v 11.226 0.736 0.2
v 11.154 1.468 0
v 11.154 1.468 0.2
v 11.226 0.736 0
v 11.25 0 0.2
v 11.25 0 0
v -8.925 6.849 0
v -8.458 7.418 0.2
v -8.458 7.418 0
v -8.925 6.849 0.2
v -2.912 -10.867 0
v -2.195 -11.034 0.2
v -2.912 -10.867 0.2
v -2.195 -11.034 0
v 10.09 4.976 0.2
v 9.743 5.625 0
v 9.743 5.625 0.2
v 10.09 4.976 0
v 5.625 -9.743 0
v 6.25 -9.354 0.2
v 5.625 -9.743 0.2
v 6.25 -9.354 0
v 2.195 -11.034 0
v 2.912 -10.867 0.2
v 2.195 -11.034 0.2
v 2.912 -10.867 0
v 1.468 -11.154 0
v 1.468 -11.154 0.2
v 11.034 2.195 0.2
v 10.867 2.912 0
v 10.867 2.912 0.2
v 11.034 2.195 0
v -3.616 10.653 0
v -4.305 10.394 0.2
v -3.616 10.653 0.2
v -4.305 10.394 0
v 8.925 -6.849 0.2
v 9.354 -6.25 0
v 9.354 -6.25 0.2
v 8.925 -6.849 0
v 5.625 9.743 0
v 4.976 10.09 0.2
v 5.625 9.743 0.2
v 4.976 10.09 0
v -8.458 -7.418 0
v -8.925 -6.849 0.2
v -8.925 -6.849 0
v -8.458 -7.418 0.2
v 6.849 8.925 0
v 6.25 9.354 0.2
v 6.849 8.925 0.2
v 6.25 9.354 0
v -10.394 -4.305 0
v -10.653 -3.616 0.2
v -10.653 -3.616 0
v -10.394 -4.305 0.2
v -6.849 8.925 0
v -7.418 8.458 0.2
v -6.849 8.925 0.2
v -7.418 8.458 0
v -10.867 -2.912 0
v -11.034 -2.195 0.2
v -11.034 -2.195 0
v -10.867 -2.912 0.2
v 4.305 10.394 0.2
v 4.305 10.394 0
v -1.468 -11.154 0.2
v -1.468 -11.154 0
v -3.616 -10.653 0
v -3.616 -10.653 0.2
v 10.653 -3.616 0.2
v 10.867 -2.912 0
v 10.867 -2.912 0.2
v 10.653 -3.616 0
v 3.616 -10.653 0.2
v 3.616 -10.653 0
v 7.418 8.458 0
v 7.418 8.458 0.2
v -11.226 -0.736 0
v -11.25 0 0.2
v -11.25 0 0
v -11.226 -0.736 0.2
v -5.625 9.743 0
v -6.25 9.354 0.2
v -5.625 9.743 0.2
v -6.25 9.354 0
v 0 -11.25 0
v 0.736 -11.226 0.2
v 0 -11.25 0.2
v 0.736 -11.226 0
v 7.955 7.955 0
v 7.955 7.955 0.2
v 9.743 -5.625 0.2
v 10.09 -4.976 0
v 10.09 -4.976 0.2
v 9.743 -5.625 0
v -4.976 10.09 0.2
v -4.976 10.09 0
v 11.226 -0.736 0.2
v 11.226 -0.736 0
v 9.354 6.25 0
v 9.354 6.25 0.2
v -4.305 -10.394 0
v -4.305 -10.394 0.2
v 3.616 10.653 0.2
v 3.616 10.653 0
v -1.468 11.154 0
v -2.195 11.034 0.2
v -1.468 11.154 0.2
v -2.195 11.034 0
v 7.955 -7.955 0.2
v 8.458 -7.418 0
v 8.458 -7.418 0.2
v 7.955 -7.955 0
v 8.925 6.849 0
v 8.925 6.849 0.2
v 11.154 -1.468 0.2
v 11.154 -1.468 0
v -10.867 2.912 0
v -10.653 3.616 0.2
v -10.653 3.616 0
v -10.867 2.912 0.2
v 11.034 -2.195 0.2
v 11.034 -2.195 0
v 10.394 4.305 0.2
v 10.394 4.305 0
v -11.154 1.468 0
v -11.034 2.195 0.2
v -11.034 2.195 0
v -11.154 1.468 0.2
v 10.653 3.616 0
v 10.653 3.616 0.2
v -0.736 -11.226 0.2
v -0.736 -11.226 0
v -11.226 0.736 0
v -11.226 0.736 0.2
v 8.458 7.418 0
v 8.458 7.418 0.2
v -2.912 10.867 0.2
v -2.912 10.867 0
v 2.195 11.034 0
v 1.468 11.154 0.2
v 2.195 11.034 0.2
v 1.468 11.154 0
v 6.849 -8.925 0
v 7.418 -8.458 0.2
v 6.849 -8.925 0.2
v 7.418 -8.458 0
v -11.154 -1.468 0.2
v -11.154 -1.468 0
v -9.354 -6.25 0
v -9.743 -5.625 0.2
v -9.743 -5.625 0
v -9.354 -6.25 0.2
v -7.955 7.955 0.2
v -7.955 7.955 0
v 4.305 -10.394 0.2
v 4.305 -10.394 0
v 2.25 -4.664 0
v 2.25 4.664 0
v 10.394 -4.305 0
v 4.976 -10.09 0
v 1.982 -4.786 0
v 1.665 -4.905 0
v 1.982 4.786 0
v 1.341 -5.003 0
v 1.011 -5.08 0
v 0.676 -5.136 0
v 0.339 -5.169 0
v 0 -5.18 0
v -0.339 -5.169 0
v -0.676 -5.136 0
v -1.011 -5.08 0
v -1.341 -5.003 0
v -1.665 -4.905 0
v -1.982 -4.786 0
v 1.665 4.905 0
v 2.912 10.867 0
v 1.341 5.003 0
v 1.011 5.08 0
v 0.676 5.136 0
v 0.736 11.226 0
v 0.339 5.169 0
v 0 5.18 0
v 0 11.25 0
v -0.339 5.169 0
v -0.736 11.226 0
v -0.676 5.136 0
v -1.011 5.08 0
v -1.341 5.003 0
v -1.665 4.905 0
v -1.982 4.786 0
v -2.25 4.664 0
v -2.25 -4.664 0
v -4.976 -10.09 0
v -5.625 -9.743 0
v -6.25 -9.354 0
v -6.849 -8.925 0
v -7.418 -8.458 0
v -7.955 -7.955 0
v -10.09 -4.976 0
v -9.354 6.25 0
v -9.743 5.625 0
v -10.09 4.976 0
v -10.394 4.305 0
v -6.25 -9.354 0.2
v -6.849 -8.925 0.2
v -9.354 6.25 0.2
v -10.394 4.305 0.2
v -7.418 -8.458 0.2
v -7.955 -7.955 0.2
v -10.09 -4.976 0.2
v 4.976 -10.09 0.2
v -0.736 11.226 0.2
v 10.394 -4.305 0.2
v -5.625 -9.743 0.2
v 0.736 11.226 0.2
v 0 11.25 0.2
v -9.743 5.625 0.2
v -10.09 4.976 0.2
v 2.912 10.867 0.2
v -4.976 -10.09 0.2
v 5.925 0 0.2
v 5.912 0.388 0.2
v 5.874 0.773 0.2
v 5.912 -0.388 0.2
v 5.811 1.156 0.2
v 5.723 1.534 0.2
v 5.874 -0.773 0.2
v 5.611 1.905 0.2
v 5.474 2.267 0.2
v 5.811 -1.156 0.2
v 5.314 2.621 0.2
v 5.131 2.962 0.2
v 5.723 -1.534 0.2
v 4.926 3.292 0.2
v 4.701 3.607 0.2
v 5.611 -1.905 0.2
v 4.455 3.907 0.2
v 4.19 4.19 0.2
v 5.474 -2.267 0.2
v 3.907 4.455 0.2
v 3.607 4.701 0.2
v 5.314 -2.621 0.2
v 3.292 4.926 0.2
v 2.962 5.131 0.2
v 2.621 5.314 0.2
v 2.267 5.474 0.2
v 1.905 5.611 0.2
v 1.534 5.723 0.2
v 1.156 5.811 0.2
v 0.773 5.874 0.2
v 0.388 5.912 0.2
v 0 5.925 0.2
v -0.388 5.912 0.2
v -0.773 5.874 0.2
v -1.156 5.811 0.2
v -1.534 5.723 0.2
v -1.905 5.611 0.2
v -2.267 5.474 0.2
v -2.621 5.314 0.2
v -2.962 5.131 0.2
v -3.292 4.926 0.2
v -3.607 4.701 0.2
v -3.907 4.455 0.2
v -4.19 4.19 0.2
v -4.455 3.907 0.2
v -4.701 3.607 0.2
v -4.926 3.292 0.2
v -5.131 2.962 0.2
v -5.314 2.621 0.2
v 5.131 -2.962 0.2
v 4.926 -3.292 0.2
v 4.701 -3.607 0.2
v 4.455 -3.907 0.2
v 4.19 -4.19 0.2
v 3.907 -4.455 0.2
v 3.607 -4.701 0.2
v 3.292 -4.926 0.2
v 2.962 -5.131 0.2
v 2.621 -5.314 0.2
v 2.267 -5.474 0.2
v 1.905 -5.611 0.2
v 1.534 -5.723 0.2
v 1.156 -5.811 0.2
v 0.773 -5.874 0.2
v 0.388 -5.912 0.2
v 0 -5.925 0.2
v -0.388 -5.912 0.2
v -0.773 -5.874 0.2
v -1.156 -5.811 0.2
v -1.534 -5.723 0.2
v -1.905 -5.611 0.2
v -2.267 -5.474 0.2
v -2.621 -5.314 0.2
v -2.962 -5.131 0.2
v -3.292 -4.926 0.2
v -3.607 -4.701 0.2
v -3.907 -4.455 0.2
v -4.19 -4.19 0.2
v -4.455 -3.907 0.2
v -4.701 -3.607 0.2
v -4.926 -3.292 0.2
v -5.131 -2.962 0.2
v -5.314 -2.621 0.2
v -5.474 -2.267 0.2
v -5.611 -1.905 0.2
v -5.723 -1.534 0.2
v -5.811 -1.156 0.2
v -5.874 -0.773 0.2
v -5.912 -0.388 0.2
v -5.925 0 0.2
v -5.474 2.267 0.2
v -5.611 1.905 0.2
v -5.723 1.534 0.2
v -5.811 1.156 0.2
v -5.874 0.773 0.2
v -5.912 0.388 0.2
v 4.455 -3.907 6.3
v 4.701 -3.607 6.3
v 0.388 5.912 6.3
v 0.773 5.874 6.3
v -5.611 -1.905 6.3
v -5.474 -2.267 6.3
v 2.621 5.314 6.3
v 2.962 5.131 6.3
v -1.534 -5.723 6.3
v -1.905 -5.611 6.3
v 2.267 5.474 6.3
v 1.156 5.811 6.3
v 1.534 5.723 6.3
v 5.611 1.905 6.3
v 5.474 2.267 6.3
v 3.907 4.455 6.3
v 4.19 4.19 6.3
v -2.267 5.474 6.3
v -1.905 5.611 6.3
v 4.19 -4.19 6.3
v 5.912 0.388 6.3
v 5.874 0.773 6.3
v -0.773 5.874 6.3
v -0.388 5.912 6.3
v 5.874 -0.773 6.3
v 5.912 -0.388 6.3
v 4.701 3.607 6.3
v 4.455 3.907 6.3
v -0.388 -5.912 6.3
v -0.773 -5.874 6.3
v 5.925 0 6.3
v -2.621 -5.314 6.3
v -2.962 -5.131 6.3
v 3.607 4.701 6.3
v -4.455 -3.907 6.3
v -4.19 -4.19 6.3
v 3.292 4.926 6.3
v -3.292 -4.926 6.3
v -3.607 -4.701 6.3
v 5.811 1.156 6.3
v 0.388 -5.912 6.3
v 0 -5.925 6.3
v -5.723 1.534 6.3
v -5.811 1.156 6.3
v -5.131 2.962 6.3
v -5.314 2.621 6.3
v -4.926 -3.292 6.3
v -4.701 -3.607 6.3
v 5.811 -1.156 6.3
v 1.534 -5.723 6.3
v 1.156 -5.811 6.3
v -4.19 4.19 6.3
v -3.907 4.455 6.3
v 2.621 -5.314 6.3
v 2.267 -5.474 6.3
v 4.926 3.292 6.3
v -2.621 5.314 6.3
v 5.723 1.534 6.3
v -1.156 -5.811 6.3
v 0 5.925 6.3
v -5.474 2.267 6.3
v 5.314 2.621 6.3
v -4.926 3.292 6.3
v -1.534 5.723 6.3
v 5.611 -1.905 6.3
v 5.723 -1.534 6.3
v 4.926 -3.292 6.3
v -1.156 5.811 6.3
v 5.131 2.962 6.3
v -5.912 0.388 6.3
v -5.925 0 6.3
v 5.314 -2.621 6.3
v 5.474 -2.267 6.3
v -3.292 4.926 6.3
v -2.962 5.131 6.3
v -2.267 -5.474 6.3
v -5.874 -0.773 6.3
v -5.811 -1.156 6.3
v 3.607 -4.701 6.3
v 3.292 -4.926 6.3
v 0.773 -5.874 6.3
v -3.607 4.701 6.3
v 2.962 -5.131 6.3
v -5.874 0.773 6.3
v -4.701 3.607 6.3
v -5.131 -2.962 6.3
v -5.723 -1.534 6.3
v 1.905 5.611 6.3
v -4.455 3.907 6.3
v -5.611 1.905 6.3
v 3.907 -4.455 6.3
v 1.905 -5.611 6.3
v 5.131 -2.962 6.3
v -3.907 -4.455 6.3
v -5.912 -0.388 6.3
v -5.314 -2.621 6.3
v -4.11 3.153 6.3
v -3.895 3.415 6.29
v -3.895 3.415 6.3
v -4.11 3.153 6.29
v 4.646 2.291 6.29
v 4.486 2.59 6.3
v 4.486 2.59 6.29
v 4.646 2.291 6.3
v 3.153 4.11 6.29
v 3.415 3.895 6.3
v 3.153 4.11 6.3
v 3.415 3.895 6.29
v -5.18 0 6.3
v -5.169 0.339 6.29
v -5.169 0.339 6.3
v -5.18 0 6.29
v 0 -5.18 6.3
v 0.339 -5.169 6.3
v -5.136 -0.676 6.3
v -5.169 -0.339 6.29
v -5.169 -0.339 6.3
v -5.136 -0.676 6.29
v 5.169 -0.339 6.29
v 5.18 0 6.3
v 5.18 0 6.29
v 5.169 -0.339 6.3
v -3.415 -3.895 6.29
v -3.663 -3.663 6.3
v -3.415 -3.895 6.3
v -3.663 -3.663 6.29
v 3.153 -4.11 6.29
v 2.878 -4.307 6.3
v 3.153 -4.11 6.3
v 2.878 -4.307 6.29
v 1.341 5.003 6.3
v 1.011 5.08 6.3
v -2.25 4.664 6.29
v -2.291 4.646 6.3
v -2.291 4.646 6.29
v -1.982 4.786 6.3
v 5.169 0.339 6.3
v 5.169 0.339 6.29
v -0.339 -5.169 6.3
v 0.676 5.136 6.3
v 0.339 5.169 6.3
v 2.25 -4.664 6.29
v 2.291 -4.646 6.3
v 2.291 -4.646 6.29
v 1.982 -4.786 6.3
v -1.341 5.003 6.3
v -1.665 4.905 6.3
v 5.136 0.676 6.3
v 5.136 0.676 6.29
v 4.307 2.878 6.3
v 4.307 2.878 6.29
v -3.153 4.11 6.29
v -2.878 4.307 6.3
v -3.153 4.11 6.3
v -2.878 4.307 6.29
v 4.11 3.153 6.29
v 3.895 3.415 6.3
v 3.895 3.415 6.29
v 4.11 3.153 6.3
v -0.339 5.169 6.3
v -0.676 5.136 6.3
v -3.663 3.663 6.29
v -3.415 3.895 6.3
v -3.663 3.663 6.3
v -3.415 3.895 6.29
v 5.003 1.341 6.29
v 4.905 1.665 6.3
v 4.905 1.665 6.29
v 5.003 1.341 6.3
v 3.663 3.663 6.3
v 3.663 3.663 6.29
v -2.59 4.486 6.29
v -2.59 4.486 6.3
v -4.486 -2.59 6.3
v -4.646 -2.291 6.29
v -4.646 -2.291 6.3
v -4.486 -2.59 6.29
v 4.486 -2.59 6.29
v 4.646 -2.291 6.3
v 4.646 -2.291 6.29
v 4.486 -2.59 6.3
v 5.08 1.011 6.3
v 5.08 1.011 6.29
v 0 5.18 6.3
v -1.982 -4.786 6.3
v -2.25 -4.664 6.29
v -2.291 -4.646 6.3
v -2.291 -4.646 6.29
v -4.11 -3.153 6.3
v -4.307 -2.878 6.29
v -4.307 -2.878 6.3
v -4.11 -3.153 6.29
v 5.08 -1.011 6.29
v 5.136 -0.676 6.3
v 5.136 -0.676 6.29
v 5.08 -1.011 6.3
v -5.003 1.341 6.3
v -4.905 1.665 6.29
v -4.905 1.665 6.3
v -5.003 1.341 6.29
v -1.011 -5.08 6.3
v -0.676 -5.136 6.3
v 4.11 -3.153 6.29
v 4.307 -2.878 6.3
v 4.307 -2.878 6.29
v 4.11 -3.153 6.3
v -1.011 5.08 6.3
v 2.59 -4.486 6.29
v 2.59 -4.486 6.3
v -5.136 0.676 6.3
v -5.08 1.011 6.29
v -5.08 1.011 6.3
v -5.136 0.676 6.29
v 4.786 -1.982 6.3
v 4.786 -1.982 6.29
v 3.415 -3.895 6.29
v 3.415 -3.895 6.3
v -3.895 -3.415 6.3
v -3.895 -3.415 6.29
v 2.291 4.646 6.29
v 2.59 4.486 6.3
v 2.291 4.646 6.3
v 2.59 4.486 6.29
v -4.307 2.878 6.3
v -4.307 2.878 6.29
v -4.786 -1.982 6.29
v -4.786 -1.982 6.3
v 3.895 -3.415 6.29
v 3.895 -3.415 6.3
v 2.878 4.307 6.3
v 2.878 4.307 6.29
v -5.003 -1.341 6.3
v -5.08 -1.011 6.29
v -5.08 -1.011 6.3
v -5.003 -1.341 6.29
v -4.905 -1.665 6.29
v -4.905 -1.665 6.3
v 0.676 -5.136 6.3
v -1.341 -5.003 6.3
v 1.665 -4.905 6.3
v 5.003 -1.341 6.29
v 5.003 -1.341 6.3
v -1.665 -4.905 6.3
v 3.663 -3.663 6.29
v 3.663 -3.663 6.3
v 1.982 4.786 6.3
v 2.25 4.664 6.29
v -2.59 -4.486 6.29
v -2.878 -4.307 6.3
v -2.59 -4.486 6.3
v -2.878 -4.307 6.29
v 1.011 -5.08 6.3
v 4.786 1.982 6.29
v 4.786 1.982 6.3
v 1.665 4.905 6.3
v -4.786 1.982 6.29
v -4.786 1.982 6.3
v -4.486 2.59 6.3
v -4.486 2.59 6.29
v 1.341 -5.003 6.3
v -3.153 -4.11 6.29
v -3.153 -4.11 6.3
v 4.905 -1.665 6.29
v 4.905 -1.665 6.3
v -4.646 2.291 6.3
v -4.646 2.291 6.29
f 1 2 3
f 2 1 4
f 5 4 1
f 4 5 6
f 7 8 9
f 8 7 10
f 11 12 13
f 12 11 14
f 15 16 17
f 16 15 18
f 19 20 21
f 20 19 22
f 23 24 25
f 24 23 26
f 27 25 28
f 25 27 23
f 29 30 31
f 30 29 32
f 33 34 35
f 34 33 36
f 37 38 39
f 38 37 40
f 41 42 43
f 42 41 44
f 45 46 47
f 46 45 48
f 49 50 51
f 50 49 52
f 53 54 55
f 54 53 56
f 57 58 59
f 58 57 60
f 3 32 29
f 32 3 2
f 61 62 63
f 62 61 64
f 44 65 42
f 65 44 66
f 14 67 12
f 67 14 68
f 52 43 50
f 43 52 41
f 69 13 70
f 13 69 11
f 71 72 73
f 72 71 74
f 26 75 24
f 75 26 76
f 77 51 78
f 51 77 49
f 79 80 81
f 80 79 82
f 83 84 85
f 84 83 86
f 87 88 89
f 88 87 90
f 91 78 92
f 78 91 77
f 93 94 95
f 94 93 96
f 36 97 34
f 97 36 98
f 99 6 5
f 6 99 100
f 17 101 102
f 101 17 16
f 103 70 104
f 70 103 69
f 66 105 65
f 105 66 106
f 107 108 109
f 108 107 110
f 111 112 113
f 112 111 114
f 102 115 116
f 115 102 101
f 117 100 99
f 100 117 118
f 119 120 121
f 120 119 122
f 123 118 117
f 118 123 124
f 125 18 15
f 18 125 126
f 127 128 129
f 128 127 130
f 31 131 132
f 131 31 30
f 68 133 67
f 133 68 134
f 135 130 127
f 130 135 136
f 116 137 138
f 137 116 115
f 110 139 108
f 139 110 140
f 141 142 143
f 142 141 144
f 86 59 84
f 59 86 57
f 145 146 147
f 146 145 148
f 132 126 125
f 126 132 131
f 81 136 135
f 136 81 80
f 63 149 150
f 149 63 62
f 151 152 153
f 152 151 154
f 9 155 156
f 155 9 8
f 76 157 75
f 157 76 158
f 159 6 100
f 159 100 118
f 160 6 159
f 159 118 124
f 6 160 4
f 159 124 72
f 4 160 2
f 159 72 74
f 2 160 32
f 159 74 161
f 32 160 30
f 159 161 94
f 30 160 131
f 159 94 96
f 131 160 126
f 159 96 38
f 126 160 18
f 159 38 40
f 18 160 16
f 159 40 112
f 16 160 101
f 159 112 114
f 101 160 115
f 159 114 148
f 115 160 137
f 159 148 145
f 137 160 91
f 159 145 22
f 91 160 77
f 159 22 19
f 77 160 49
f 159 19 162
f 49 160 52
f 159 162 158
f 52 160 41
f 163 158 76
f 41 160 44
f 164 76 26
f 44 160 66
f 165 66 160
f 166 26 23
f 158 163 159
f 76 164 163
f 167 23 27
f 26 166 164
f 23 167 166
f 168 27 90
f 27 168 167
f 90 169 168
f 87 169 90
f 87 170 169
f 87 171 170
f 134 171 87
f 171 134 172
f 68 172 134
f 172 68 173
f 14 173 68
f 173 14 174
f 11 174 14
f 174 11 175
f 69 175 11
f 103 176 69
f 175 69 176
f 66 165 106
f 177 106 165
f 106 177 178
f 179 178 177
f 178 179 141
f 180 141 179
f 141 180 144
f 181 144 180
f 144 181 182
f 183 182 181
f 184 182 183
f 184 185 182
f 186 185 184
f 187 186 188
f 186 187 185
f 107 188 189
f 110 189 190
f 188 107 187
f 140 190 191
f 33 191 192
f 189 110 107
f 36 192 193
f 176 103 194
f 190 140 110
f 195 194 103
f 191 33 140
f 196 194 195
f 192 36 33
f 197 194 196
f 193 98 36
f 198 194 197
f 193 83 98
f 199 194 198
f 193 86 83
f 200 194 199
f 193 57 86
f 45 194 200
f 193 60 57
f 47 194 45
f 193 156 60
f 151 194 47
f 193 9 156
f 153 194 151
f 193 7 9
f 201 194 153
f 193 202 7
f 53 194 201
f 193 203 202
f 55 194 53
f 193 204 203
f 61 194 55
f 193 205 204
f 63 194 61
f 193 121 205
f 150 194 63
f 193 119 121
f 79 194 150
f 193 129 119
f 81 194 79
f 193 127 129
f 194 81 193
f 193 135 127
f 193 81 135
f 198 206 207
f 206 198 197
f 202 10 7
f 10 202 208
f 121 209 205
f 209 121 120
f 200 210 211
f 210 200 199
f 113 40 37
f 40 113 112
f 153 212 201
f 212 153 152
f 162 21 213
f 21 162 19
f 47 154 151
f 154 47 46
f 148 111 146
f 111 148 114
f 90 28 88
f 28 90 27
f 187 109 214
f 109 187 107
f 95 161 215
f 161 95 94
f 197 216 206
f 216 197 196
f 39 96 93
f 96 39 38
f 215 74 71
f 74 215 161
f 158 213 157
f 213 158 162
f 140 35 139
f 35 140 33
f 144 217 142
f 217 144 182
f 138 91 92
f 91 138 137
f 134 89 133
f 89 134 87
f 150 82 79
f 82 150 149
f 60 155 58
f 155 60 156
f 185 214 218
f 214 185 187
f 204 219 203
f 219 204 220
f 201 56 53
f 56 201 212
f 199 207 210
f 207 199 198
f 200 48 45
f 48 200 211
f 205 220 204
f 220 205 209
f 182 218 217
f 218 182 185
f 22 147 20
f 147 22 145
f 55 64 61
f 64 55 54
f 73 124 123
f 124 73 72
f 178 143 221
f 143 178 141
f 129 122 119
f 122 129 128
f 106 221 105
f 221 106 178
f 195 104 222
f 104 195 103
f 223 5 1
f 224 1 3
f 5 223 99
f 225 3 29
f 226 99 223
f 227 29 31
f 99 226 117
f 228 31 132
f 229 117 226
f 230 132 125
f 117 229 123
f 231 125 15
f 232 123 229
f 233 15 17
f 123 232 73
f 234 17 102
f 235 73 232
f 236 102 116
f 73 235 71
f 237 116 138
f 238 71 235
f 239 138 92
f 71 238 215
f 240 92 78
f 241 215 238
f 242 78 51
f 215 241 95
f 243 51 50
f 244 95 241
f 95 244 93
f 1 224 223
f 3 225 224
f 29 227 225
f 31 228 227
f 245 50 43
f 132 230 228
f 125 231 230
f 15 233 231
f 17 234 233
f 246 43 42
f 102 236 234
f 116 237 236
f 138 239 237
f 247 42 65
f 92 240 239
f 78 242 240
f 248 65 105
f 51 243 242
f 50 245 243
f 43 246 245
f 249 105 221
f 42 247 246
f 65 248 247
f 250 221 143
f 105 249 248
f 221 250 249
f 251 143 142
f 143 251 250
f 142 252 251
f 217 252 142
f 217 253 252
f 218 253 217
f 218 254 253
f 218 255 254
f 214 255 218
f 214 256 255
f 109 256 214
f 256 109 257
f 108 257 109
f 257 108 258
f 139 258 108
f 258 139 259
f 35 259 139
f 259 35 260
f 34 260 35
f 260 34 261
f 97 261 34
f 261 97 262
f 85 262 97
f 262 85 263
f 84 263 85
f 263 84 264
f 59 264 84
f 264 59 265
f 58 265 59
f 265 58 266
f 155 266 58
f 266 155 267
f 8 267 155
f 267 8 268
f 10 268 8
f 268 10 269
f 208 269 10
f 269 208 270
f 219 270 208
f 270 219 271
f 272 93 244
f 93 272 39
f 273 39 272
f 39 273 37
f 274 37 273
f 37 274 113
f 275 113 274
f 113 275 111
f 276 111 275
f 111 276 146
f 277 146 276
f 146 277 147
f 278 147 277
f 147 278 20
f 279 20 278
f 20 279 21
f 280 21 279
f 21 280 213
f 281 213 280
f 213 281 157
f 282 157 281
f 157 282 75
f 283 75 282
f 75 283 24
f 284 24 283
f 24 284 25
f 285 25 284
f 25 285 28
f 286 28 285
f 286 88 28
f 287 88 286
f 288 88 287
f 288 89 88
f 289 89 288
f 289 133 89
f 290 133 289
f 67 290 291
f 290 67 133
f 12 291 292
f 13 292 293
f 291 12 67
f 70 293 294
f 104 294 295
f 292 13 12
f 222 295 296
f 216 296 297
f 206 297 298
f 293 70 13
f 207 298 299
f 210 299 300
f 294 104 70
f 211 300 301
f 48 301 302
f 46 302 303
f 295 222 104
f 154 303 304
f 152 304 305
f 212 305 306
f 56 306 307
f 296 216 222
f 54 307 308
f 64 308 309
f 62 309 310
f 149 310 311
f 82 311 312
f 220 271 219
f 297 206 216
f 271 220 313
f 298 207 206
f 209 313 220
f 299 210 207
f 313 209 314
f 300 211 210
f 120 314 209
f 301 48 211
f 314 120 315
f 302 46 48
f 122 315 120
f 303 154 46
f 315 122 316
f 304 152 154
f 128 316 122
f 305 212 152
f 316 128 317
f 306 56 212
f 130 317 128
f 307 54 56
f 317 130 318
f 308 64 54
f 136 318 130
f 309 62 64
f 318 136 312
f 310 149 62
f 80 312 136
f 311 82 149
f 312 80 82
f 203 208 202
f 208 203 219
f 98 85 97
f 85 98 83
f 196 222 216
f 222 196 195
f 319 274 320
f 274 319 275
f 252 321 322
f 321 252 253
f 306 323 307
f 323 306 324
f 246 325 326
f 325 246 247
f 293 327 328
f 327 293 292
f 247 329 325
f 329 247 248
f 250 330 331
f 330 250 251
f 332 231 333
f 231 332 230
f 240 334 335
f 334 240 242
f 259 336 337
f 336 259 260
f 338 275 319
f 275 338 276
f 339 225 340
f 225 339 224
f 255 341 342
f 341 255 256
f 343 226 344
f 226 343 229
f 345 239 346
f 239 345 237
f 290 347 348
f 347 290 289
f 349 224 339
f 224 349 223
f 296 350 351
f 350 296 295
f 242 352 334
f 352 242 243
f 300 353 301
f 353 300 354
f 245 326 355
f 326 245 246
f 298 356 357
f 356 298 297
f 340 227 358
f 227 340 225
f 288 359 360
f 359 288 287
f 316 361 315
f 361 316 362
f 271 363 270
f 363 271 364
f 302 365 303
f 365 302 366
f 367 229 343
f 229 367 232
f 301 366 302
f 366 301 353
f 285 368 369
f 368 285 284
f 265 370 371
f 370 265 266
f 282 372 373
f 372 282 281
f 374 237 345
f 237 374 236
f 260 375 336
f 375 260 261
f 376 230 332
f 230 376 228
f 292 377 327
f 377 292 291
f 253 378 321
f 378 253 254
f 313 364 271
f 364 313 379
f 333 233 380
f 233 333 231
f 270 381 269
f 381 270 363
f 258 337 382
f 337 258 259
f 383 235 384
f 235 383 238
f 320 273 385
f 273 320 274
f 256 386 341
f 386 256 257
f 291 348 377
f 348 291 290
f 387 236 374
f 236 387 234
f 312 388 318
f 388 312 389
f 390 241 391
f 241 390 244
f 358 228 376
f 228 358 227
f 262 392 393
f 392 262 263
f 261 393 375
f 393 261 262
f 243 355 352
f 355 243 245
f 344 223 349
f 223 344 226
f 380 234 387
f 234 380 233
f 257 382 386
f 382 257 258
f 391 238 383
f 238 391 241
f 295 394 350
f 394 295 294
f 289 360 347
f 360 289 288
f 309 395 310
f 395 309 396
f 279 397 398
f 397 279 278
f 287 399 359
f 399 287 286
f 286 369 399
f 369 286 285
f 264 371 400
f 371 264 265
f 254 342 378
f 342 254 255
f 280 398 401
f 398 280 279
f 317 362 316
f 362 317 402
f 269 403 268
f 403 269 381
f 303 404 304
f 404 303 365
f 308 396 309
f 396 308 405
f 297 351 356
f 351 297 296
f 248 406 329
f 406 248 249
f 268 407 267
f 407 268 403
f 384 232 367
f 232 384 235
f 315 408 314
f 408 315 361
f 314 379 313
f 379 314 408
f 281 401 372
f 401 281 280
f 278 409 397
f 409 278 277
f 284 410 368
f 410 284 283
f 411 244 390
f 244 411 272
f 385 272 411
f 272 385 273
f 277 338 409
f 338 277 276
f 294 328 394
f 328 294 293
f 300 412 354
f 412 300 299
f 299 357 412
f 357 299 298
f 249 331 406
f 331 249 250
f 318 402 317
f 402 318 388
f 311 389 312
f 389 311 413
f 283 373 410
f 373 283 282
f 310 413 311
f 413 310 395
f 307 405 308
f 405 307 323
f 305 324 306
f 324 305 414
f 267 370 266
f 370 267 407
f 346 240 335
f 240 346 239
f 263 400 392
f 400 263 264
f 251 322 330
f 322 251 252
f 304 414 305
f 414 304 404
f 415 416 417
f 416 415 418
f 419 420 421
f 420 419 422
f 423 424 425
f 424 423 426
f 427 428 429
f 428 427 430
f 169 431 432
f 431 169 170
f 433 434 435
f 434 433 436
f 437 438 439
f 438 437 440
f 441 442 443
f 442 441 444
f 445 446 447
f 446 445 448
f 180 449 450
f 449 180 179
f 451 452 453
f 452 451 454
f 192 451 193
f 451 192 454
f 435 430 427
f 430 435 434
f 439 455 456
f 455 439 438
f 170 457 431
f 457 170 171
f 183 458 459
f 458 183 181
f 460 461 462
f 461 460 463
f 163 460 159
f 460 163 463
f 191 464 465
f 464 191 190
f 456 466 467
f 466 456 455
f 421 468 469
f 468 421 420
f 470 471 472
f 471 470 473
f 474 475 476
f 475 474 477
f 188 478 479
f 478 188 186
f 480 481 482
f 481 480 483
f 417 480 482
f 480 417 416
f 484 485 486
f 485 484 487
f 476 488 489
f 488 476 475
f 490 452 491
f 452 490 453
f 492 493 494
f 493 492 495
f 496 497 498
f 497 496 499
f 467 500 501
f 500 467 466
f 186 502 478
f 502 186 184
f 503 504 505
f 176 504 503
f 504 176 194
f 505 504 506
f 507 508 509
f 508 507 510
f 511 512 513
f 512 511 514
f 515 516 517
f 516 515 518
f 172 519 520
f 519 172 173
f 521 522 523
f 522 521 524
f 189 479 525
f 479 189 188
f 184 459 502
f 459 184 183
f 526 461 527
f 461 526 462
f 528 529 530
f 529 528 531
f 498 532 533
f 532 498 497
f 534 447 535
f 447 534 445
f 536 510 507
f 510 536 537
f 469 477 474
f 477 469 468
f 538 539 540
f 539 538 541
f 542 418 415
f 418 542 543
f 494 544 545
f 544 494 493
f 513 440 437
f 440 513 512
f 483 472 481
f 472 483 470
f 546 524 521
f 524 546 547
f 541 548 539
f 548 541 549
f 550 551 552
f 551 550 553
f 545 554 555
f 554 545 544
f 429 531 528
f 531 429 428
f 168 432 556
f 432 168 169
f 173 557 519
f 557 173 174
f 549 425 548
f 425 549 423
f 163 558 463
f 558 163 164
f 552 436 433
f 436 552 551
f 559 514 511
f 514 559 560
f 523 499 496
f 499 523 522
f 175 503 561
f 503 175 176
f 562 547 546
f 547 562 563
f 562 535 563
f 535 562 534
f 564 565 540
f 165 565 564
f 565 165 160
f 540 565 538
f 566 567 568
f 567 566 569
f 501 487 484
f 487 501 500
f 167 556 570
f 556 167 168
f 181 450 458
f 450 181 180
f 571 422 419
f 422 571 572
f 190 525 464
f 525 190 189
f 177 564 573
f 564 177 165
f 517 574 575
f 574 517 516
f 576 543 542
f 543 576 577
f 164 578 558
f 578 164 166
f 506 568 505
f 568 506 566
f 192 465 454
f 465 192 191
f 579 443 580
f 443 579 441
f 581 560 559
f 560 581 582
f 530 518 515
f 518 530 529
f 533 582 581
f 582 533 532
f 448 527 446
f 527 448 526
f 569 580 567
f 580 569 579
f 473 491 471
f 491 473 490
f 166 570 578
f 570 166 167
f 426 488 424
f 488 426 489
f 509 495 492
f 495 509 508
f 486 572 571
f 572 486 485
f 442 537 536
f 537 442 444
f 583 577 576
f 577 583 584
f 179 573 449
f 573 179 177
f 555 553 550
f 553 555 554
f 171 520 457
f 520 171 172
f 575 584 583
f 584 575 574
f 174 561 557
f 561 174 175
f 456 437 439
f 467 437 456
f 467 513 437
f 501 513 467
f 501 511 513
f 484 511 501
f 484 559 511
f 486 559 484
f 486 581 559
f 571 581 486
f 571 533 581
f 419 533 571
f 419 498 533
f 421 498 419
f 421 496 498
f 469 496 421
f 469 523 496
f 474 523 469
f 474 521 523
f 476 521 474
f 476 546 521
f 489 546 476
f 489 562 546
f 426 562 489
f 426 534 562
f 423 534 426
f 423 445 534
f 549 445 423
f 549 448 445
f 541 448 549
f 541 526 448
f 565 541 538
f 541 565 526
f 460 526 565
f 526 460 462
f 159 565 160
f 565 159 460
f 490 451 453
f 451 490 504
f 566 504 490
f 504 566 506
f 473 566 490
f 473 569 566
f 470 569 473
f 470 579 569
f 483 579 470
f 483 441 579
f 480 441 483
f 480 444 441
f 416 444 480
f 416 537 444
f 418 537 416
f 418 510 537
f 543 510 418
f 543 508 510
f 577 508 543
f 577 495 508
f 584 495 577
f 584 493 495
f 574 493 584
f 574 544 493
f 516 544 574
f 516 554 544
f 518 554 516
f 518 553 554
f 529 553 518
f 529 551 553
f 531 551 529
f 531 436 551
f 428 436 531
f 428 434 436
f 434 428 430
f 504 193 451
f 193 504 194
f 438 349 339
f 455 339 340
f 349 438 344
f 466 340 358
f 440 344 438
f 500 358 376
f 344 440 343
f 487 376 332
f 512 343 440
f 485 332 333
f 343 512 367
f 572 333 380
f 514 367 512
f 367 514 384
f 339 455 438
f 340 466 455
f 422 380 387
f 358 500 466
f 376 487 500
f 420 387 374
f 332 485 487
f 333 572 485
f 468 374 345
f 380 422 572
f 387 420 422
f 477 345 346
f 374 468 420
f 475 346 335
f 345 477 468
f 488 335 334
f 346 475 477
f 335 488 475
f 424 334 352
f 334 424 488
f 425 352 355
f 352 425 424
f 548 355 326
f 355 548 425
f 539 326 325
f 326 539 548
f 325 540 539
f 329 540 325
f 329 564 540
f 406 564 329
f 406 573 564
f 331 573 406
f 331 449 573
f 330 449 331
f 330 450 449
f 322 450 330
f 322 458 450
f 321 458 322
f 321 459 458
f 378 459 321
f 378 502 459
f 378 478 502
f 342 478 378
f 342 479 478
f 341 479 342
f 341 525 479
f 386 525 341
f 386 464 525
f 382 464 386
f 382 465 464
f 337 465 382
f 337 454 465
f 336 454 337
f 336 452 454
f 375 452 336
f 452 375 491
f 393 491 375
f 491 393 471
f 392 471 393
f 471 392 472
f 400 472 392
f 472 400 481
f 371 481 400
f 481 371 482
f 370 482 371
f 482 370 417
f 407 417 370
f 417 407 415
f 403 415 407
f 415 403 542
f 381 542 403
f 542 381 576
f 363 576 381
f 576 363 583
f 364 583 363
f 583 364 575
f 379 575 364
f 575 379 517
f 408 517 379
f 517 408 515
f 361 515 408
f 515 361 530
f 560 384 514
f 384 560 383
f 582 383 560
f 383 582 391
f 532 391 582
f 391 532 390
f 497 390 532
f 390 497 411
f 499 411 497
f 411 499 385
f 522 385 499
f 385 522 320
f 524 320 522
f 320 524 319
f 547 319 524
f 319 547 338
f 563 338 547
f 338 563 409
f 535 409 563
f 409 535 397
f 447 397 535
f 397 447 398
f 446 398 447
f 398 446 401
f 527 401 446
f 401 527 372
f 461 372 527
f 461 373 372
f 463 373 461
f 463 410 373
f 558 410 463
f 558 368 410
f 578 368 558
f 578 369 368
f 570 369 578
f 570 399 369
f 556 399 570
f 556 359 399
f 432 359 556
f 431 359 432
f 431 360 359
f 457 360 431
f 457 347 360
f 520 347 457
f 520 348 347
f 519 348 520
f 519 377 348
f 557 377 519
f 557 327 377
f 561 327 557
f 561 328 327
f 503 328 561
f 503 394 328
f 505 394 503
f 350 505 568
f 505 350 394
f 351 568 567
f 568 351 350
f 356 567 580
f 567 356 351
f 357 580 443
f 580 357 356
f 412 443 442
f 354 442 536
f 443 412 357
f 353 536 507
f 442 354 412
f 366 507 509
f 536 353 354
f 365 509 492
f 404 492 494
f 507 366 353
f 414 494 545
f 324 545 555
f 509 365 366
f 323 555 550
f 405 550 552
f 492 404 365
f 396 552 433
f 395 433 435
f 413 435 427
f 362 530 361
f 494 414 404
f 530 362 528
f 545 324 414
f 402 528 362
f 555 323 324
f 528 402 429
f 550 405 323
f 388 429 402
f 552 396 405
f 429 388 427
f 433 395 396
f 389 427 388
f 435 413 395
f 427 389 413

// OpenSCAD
// file: ../lib/common.scad
// Common modules for use across models

epsilon=0.02;

module hollow_cylinder(h,d_inner,d_outer) {
  difference() {
    cylinder(h=h,d=d_outer);
    translate([0,0,-epsilon/2]) {
      cylinder(h=h+epsilon, d=d_inner);
    }
  }
}

module hollow_prism(h, lx_outer, lx_inner, ly_outer, ly_inner) {
  difference() {
    cube([lx_outer, ly_outer, h]);
    translate([(lx_outer-lx_inner)/2,(ly_outer-ly_inner)/2,-epsilon/2]) {
      cube([lx_inner, ly_inner,h+epsilon]);
    }
  }
}

module right_triangle(lx, ly) {
  polygon(points=[[0,0],
                  [lx,0],
                  [0,ly],
                  [0,0]]);
}

// A 2D rectangle with rounded corners
module rounded_rectangle(width, height, radius) {
  r = radius;
  x1 = r;
  y1 = r;
  x2 = width - r;
  y2 = height - r;
  hull() {
    translate([x1, y1, 0]) circle(radius);
    translate([x2, y1, 0]) circle(radius);
    translate([x1, y2, 0]) circle(radius);
    translate([x2, y2, 0]) circle(radius);
  }
}

// 3D rectangle with cylindrical rounded corners. Scale gives an optional flare to the top.
module rounded_prism(width, length, height, radius, scale=1) {
  translate([width/2, length/2]) {
    linear_extrude(height=height, scale=scale) {
      translate([-width/2, -length/2]) {
        rounded_rectangle(width, length, radius);
      }
    }
  }
}

// A squished sphere with the specified radii
module squashed_sphere(h_radius, v_radius) {
  resize([h_radius*2, h_radius*2, v_radius*2]) {
    sphere(r=h_radius);
  }
}

// 3D rectangle with spherical rounded corners
module pillowed_prism(width, length, height, h_radius, v_radius) {
  x1 = h_radius;
  y1 = x1;
  x2 = width - h_radius;
  y2 = length - h_radius;
  hull() {
    translate([x1, y1,  height/2-v_radius]) squashed_sphere(h_radius, v_radius);
    translate([x2, y1,  height/2-v_radius]) squashed_sphere(h_radius, v_radius);
    translate([x1, y2,  height/2-v_radius]) squashed_sphere(h_radius, v_radius);
    translate([x2, y2,  height/2-v_radius]) squashed_sphere(h_radius, v_radius);
    translate([x1, y1, -height/2+v_radius]) squashed_sphere(h_radius, v_radius);
    translate([x2, y1, -height/2+v_radius]) squashed_sphere(h_radius, v_radius);
    translate([x1, y2, -height/2+v_radius]) squashed_sphere(h_radius, v_radius);
    translate([x2, y2, -height/2+v_radius]) squashed_sphere(h_radius, v_radius);
  }
}

// Returns a volume that contains all of the points above or below the
// specified z
module xy(above, below)
{
  d = 10000;
  if (below == undef)
    translate([0,0,above+d/2]) cube([d,d,d] ,center=true);
  else
    translate([0,0,below-d/2]) cube([d,d,d], center=true);
}

// Lays things out in a line with labels
// TODO: Lay them out in a grid instead
module display(w, l=10, padding=2) {
  for (n = [0:2:$children-1]) {
    translate([(w + padding) * n/2, 0, 0]) {
      translate([0, l, 0]) {
        children(n+1);
      }
      color([0,0,0])
        children(n);
    }
  }
}

module quarter_cylinder(r, h) {
  difference() {
    translate([0,0,h/2]) {
      cylinder(r=r, h=h, center=true);
    }
    translate([-r*2-epsilon,-r*2,-epsilon]) {
      cube([r*2,r*4,h*2]);
    }
    translate([-r*2-epsilon,-r*2,-epsilon]) {
      cube([r*4,r*2,h*2]);
    }

  }
}

function bit_test(val, bit) = floor(val / (pow(2,bit))) % 2;

function inches(in) = in * 25.4;
// main file
use <../lib/common.scad>;

$fn=96;
e=0.01;

module post_receiver( // export
  d = 11.85,
  h = 6.3,
  brim_d = 22.5,
  brim_h = 0.2,
  recess_w = 4.5,
  wall_t = 1.5
  )
{
  union() {
    // Brim
    difference() {
      cylinder(d = brim_d, h = brim_h);
      translate([0, 0, -e]) {
        cylinder(d = d, h = brim_h + 2 * e);
      }
    }
    // Walls
    difference() {
      // Outer wall
      cylinder(d = d, h = h);
      translate([0,0,-e]) {
        difference() {
          // Inner wall
          cylinder(d = d - wall_t + e, h = h + 2 * e);
          // Right side of post recess
          translate([recess_w/2, -d/2, 0]) {
            cube([d,d,h], center=false);
          }
          // Left side of post recess;
          mirror([1,0,0]) {
            translate([recess_w/2, -d/2, 0]) {
              cube([d,d,h], center=false);
            }
          }
        }
      }
    }
  }
}

module unit() { //export
  post_receiver();
}

unit();
